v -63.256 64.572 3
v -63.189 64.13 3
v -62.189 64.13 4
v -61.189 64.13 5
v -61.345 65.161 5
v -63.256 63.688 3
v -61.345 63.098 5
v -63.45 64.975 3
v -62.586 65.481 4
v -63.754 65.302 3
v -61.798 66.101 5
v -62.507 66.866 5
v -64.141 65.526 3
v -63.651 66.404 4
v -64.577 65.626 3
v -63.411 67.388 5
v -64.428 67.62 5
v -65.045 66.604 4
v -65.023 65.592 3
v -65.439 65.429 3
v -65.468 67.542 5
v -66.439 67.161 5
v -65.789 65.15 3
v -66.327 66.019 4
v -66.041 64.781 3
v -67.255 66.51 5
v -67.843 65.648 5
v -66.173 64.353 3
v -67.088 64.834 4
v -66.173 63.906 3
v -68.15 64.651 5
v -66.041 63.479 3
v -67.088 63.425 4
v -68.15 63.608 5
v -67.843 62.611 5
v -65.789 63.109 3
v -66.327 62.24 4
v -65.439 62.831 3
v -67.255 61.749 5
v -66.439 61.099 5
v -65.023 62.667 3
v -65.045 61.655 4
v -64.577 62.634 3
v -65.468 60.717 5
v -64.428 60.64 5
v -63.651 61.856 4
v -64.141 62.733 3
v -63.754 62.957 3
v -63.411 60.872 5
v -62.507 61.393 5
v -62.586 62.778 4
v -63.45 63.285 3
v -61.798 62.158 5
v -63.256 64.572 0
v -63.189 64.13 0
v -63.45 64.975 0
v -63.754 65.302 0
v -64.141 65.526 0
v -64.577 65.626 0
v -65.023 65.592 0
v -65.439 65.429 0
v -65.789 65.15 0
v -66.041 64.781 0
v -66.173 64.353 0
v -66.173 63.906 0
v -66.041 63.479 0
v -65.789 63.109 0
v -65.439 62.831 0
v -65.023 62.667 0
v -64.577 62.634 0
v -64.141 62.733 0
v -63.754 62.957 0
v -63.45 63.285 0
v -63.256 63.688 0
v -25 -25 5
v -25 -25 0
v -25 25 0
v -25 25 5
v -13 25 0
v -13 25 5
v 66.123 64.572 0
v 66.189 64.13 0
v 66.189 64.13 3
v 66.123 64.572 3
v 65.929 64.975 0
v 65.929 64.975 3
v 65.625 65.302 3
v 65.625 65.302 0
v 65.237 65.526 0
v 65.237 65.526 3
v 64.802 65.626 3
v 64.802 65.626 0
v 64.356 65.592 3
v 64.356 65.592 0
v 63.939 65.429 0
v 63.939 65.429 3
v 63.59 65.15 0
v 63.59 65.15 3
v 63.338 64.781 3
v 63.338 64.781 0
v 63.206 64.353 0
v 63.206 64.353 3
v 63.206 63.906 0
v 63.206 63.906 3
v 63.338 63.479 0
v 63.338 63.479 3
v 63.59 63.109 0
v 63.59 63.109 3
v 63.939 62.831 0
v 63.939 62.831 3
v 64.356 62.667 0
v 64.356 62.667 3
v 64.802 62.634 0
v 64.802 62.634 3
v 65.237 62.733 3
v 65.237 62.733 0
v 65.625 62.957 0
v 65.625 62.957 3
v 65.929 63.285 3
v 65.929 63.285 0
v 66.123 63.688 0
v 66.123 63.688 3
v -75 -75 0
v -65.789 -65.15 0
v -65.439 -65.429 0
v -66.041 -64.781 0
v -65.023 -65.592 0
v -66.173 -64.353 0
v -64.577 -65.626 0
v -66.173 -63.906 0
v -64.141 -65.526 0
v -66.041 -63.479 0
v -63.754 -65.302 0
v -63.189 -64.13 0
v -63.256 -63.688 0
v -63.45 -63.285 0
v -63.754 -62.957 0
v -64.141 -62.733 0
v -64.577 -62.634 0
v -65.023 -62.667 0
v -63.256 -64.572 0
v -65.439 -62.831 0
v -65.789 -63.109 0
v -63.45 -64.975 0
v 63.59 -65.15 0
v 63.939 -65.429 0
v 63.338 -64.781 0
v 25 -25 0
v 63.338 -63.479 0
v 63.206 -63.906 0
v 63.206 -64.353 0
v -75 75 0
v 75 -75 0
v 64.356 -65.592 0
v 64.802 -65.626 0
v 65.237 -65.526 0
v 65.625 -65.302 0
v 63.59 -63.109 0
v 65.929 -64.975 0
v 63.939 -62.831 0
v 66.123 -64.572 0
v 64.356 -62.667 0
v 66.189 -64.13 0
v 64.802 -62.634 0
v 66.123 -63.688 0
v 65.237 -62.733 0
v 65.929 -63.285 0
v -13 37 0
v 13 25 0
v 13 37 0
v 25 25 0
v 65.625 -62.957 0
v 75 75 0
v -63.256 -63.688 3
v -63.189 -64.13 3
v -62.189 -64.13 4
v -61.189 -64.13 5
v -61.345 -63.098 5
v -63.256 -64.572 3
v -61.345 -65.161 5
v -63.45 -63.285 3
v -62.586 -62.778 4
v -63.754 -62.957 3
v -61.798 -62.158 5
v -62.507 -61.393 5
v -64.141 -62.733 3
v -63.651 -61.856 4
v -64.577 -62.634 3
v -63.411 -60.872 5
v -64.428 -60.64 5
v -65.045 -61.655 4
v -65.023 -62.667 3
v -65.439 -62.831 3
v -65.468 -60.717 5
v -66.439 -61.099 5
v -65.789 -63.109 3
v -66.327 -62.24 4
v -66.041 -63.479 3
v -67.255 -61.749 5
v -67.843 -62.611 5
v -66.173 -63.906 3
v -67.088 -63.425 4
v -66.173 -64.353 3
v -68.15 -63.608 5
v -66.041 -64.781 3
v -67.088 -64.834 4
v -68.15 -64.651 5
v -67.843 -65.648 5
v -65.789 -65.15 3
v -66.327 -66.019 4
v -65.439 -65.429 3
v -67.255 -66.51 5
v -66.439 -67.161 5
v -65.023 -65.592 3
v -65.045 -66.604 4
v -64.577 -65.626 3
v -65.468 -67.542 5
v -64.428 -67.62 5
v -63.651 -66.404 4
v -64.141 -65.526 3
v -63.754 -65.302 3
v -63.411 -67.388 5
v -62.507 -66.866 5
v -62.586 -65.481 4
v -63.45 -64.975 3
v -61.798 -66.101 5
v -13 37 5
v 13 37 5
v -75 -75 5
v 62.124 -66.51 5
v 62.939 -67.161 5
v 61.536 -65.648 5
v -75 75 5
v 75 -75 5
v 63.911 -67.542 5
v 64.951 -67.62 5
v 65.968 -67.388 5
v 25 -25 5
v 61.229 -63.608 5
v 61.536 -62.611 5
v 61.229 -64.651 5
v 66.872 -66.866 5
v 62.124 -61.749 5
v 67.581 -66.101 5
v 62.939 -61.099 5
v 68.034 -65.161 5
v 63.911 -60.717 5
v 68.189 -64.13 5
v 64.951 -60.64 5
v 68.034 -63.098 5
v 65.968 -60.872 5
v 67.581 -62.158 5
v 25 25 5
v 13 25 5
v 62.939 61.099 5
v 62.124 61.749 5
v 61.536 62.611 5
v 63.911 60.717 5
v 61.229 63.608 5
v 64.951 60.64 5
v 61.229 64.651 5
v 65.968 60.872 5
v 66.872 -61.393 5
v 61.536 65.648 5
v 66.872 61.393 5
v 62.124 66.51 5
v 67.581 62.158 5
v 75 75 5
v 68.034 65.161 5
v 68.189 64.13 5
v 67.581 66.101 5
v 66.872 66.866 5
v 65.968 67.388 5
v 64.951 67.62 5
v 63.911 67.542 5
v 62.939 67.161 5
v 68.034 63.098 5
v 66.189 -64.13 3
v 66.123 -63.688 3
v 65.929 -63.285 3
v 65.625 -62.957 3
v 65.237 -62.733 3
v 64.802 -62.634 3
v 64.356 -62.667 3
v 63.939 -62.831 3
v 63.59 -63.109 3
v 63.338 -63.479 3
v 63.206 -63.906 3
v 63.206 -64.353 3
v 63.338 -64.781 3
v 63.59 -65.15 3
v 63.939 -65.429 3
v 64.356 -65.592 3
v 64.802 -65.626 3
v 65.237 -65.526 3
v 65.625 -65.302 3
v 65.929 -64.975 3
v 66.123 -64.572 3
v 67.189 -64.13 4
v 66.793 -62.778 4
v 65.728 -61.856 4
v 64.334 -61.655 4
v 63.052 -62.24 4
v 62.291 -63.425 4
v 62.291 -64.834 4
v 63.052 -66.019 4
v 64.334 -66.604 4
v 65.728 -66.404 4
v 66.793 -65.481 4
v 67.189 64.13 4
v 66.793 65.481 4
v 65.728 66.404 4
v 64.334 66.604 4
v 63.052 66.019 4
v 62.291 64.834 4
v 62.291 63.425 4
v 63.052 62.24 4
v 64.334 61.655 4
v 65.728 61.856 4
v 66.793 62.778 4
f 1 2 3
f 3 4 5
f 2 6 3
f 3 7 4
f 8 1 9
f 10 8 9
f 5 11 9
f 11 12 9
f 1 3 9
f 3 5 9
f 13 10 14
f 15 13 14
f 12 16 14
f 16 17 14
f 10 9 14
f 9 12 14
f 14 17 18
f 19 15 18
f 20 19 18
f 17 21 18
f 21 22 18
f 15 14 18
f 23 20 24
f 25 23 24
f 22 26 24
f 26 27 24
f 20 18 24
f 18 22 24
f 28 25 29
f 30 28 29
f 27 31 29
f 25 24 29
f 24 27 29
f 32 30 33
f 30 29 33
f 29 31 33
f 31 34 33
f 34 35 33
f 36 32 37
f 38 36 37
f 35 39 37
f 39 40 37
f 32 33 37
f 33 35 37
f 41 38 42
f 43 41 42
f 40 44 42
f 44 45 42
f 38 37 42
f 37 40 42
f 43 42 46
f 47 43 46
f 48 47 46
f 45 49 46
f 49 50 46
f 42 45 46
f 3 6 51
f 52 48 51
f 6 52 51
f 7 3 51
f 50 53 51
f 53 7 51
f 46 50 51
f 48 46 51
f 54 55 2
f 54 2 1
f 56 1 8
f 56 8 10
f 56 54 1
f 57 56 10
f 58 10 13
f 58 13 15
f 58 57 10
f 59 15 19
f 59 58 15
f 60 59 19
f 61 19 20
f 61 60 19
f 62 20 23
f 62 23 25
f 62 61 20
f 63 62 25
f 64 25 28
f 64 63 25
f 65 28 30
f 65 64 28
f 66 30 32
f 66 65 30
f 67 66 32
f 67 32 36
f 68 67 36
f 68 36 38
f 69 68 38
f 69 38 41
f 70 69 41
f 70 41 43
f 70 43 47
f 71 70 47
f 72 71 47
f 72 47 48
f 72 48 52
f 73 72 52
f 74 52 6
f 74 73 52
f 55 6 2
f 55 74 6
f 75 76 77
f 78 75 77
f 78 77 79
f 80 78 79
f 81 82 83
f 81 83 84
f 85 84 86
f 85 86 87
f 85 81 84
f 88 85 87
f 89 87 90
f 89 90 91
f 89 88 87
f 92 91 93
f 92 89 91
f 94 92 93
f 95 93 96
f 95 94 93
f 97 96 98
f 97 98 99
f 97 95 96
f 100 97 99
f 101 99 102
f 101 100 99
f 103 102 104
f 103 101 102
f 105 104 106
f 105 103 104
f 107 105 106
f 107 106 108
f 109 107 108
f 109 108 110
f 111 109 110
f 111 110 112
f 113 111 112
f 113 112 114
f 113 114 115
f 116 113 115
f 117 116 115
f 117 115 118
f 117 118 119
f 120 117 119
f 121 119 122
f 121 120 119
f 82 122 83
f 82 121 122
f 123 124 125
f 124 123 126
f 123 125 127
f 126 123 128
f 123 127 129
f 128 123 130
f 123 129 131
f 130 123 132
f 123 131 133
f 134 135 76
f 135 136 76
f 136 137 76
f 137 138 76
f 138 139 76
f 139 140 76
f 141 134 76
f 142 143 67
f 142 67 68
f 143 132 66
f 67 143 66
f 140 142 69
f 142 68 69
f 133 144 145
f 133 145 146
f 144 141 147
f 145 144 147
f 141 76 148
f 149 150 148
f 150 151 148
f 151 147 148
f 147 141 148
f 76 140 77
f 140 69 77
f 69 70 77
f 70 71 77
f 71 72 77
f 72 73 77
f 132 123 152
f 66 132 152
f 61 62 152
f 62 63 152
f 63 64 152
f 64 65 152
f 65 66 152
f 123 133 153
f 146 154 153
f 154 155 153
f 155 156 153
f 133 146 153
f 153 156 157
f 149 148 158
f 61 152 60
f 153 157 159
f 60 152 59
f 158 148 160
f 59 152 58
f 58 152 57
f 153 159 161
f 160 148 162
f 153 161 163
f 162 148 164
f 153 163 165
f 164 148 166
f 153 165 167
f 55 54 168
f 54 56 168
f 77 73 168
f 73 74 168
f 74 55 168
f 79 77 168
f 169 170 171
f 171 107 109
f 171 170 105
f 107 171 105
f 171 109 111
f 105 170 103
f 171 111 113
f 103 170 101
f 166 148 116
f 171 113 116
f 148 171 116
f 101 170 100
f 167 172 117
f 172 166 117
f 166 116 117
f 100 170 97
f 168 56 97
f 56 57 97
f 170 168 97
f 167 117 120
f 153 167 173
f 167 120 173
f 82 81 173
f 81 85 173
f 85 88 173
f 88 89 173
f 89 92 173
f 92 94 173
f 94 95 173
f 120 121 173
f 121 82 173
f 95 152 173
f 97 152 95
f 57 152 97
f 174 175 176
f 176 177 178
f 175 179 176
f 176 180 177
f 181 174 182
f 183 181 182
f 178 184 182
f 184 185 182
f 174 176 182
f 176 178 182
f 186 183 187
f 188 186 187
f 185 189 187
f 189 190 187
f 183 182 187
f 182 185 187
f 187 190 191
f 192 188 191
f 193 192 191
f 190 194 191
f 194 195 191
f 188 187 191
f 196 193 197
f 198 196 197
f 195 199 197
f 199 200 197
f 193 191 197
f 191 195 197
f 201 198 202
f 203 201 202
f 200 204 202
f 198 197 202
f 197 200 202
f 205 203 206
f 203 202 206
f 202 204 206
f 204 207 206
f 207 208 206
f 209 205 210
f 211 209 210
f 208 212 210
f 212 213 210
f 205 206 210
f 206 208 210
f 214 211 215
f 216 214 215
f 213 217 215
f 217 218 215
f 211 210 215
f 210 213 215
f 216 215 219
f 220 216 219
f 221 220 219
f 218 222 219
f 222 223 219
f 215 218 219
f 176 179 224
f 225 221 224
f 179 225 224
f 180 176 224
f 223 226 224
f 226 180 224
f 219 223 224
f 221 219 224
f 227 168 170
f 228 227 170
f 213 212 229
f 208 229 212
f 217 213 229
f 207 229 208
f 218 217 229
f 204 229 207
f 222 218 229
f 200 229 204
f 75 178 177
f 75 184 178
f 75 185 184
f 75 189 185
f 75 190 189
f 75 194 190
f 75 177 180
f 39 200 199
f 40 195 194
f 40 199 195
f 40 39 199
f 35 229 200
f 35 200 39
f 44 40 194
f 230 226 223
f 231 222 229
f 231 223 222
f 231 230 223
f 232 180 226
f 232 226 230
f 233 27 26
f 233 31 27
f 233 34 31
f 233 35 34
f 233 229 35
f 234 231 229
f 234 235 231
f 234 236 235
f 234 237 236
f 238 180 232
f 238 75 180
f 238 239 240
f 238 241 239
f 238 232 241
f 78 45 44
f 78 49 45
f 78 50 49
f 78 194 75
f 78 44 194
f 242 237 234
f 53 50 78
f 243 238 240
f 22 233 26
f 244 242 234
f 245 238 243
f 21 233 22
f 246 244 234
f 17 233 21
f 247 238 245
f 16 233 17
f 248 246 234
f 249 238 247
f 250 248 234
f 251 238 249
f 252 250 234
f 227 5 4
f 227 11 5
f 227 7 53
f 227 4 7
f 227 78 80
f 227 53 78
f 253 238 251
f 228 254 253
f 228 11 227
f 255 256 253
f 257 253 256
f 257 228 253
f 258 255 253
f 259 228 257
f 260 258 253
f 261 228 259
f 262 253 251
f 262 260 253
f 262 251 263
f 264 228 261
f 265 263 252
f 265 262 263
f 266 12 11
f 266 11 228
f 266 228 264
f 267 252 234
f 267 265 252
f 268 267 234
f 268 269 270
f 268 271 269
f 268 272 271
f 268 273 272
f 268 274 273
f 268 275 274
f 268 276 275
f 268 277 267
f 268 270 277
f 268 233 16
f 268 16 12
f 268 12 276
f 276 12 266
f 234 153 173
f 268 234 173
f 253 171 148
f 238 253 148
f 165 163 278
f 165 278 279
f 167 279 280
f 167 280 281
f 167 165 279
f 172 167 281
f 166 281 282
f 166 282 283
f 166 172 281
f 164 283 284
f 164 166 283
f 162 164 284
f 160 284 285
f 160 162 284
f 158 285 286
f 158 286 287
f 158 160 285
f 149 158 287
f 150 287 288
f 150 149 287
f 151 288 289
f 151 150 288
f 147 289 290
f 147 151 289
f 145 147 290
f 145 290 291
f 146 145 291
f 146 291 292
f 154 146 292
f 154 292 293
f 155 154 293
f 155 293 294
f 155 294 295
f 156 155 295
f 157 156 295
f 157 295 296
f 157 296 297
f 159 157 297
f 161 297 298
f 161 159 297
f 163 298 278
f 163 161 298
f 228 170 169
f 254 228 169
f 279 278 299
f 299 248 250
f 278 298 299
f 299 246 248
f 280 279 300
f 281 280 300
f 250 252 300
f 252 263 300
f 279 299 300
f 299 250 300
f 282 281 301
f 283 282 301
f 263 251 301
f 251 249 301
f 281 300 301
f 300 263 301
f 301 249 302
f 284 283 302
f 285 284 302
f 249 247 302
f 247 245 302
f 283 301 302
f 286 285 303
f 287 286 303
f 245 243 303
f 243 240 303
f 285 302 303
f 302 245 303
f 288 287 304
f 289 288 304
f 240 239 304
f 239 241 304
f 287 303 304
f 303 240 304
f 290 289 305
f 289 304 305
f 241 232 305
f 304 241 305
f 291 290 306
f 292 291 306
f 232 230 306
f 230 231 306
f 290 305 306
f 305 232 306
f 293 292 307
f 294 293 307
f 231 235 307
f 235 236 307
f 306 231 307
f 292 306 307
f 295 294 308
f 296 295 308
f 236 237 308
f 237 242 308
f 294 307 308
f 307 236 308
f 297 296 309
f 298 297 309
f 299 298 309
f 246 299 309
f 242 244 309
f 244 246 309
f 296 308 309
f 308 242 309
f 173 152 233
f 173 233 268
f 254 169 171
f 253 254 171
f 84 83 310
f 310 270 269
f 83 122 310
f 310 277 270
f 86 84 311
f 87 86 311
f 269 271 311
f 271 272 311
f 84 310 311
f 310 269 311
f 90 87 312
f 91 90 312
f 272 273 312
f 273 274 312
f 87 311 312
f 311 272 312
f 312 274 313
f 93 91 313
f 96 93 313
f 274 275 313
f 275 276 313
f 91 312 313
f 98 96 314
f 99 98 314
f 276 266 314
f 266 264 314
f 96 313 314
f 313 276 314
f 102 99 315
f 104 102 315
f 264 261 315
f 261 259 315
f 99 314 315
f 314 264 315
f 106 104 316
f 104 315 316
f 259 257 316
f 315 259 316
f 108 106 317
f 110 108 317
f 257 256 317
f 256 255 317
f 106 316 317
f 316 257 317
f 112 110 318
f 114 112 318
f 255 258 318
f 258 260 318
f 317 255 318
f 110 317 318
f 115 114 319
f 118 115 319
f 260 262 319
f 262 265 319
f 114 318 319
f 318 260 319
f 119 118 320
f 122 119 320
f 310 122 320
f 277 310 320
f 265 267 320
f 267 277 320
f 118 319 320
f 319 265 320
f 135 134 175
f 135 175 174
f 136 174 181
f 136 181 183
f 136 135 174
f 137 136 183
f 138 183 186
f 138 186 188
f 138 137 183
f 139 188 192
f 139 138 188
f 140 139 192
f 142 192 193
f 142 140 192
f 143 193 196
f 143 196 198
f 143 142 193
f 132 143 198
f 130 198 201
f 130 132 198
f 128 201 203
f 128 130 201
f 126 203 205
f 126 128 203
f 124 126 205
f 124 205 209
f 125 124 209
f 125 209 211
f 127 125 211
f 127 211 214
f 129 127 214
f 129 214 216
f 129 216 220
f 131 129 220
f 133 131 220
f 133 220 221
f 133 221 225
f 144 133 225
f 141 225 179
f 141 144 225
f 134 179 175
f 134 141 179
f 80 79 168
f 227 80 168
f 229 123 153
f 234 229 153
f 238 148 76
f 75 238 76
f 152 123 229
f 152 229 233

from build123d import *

# Parameters (mm, degrees)
F0_W     = 150
F0_H     = 150
F0_R     = 1.5
F1_DEPTH = 5
F2_SIZE  = 2


with BuildPart() as f1:
    # F0 (on Top) → F1 (new body)
    with BuildSketch(Plane.XY):
        Rectangle(F0_W, F0_H)
        with Locations((-64.68948, -64.129733)):
            Circle(F0_R, mode=Mode.SUBTRACT)
        with Locations((64.68948, -64.129733)):
            Circle(F0_R, mode=Mode.SUBTRACT)
        with Locations((-64.68948, 64.129733)):
            Circle(F0_R, mode=Mode.SUBTRACT)
        Polygon((-25, -25), (-25, 25), (-13, 25), (-13, 37), (13, 37), (13, 25), (25, 25), (25, -25), align=None, mode=Mode.SUBTRACT)
        with Locations((64.68948, 64.129733)):
            Circle(F0_R, mode=Mode.SUBTRACT)
    extrude(amount=F1_DEPTH)

    # F2
    f2_edges = [f1.edges().sort_by_distance(p)[0] for p in [
        (-66.18948, 64.129733, 5),
        (-66.18948, -64.129733, 5),
        (63.18948, -64.129733, 5),
        (63.18948, 64.129733, 5),
    ]]
    chamfer(f2_edges, length=F2_SIZE)


solid = f1.part
